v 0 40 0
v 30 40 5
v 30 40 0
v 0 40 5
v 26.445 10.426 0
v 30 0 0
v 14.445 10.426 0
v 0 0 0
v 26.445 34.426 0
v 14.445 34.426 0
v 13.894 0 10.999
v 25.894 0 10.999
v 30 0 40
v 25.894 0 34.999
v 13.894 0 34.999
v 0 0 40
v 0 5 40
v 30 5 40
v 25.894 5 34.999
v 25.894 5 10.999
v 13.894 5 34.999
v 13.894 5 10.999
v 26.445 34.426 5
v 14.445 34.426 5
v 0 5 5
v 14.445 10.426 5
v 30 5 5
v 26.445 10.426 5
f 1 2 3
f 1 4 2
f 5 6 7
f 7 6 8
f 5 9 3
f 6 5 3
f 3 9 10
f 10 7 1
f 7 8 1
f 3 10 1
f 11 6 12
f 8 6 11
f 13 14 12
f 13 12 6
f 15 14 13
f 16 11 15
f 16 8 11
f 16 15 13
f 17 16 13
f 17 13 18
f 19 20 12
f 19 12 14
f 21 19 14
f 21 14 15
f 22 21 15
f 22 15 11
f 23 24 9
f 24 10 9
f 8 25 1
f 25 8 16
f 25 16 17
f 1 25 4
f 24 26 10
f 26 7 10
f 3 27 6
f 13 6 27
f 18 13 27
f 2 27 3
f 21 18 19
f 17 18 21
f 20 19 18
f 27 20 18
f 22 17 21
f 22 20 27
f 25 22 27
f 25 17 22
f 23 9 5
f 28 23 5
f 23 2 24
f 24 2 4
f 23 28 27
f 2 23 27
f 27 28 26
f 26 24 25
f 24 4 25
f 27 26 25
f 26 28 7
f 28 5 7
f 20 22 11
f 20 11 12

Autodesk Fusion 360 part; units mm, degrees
sketch "Esquisse1" plane through (0, 0, 0) normal (1, 0, 0) x (0, 1, 0)
  line L0 (0, 0) -> (40, 0)
  line L1 (0, 0) -> (0, 40)
  line L2 (0, 40) -> (5, 40)
  line L3 (5, 40) -> (5, 5)
  line L4 (5, 5) -> (40, 5)
  line L5 (40, 5) -> (40, 0)
  dimension "d2" = 40
extrude "Extrusion1" add sketch "Esquisse1" along normal blind 30
sketch "Esquisse2" plane through (0, 0, 0) normal (0, 0, 1) x (1, 0, 0)
  line L0 (9.4451, 34.4261) -> (21.4451, 34.4261)
  line L1 (21.4451, 34.4261) -> (21.4451, 10.4261)
  line L2 (21.4451, 10.4261) -> (9.4451, 10.4261)
  line L3 (9.4451, 10.4261) -> (9.4451, 34.4261)
  dimension "d5" = 12
  dimension "d6" = 24
extrude "Extrusion2" cut sketch "Esquisse2" along normal blind 6
sketch "Esquisse4" plane through (0, 5, 0) normal (0, 1, 0) x (-1, 0, 0)
  line L0 (0, 5) -> (0, 40)
  line L1 (0, 40) -> (-30, 40)
  line L2 (-30, 40) -> (-30, 5)
  line L3 (-30, 5) -> (0, 5)
  line L4 (-8.8938, 10.999) -> (-20.8938, 10.999)
  line L5 (-20.8938, 10.999) -> (-20.8938, 34.999)
  line L6 (-20.8938, 34.999) -> (-8.8938, 34.999)
  line L7 (-8.8938, 34.999) -> (-8.8938, 10.999)
  dimension "d15" = 12
  dimension "d16" = 24
extrude "Extrusion3" cut sketch "Esquisse4" against normal blind 34 contours L4 L5 L6 L7
extrude "Extrusion4" cut 1 faces at (20.8938, 3.3333, 18.999) along direction (1, 0, 0) blind 5
extrude "Extrusion5" add 1 faces at (8.8938, 3.3333, 26.999) along direction (1, 0, 0) blind 5
extrude "Extrusion6" cut 1 faces at (21.4451, 26.4261, 1.6667) along direction (1, 0, 0) blind 5
extrude "Extrusion7" add 1 faces at (9.4451, 18.4261, 1.6667) along direction (1, 0, 0) blind 5
